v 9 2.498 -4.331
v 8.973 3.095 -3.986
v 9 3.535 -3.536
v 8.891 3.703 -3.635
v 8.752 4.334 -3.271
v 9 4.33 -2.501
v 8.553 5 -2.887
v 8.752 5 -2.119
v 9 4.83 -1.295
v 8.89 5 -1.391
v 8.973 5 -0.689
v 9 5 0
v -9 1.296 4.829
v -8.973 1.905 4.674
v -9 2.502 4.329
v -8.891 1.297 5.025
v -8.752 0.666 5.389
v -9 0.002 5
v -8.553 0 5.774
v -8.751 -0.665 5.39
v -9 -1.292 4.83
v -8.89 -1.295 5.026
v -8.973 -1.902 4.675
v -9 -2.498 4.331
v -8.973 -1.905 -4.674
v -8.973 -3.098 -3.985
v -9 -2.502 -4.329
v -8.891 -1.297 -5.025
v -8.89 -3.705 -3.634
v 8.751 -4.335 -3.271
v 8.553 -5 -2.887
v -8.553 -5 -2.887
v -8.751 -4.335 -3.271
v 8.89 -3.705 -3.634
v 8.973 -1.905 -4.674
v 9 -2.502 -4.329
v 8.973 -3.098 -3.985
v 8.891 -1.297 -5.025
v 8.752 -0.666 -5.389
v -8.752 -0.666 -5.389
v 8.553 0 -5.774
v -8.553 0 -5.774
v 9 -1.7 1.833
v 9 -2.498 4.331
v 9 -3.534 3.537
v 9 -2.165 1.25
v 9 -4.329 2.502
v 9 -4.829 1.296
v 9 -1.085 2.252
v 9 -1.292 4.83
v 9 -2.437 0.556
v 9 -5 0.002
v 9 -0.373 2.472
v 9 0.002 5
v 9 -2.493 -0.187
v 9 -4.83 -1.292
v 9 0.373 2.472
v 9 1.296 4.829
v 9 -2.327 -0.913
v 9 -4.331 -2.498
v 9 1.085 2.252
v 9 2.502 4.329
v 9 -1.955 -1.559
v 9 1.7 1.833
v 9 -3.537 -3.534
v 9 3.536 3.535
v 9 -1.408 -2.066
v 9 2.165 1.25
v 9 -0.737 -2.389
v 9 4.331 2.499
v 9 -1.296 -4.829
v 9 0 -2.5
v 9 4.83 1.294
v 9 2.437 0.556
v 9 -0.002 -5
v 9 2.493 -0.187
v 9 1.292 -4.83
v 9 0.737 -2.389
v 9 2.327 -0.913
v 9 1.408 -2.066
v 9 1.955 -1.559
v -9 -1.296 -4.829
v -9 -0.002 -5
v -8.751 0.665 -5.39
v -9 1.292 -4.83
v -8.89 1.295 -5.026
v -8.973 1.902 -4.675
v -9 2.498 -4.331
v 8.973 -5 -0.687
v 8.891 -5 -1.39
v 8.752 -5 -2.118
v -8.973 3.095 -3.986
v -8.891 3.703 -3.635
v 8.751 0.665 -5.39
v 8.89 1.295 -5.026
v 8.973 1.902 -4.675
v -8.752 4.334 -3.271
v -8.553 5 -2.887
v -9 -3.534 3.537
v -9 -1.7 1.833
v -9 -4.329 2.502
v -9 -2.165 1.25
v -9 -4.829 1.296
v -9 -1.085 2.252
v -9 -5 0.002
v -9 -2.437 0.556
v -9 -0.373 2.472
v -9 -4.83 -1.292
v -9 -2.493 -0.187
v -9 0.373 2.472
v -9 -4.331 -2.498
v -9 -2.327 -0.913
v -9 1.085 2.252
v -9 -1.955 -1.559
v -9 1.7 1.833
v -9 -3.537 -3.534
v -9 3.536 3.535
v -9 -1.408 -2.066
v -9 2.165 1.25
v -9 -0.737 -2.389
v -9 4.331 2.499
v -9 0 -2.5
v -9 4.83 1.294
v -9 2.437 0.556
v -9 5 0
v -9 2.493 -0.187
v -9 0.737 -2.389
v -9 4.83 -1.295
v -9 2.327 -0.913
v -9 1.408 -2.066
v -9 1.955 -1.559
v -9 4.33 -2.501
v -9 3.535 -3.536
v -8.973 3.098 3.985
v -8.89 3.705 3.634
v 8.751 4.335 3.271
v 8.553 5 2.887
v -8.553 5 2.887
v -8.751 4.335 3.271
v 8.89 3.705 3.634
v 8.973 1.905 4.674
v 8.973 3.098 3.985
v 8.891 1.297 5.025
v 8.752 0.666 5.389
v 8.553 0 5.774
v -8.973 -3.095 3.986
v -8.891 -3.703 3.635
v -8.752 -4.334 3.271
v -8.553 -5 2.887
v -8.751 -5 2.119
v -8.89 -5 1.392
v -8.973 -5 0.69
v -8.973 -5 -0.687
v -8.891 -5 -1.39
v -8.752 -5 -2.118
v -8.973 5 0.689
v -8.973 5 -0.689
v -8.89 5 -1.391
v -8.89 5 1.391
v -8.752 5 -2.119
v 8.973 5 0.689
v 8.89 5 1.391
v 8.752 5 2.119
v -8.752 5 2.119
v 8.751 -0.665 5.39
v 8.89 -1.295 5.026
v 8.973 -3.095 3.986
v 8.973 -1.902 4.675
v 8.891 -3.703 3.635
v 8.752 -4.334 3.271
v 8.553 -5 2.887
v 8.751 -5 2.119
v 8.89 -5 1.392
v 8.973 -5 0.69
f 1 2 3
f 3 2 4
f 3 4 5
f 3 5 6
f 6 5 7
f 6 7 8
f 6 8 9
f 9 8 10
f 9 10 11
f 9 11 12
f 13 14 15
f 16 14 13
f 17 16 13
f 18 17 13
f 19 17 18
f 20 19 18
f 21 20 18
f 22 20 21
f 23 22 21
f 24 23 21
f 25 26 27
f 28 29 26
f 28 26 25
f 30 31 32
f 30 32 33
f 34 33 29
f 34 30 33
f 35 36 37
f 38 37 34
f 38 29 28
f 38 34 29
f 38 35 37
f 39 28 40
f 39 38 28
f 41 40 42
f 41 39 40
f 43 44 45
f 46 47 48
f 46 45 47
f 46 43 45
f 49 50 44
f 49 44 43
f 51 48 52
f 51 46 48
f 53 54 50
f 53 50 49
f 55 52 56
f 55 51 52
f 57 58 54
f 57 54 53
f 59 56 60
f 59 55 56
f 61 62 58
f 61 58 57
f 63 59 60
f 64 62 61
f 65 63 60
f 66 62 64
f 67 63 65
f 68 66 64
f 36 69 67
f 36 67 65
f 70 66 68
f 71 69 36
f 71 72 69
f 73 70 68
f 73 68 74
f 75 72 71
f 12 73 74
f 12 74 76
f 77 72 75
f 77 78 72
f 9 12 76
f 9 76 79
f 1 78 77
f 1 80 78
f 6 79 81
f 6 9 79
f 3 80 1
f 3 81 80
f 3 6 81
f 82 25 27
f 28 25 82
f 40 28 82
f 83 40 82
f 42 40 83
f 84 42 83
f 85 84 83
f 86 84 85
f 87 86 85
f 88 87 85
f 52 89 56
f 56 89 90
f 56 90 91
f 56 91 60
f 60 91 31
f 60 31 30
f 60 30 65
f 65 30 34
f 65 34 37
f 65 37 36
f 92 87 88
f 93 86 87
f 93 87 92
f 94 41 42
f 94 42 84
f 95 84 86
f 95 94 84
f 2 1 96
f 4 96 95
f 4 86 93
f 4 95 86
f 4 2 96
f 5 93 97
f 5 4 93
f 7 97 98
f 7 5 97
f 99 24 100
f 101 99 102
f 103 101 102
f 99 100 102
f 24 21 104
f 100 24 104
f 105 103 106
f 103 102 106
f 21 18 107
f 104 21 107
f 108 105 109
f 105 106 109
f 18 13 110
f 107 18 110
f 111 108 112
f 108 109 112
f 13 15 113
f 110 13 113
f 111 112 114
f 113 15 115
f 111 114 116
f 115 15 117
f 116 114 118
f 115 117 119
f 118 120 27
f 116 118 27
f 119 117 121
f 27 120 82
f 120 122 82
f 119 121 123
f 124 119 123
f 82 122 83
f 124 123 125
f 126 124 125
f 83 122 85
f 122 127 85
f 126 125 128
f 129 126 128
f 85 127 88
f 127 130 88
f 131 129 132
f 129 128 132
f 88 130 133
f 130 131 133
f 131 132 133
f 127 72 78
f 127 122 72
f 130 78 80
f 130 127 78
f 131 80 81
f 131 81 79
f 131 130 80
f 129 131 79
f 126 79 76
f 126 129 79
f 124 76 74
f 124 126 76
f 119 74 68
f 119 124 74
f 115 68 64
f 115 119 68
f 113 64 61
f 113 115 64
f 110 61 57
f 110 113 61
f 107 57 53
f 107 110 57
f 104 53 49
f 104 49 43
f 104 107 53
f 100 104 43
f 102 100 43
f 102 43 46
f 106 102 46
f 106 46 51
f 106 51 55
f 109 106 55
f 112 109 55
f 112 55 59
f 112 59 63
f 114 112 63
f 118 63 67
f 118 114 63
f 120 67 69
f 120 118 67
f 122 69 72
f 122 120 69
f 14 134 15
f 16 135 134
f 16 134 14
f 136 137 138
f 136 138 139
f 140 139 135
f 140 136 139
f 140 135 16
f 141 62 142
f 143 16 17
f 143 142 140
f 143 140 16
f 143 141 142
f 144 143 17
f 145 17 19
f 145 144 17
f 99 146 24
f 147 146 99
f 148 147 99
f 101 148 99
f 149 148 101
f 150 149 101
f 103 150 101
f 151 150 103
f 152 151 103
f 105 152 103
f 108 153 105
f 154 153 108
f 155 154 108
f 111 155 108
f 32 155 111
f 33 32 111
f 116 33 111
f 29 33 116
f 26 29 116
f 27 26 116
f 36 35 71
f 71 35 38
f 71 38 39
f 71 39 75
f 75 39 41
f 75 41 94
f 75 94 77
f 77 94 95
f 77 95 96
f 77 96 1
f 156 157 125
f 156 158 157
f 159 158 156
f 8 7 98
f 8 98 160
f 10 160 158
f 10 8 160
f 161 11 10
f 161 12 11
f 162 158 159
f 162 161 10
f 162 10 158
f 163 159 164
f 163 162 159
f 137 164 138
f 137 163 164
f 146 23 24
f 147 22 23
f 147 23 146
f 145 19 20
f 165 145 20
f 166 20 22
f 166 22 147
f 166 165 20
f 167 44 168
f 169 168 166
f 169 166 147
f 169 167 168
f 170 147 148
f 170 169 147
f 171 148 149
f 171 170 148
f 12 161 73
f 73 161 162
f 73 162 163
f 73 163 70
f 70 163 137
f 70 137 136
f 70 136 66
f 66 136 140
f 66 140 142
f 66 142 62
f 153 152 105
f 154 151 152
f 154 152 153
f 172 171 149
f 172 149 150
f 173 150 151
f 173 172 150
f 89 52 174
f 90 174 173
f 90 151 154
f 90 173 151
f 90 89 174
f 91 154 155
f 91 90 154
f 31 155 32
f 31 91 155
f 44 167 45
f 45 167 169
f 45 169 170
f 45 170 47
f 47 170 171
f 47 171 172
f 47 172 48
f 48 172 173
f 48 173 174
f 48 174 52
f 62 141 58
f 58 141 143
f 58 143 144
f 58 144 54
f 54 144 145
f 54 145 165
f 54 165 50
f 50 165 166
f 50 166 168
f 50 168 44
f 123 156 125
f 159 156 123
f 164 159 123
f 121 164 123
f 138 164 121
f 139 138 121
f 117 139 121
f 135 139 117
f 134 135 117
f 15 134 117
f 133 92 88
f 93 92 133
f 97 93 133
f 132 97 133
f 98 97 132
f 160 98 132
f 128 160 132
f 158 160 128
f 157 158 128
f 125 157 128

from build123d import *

# Parameters (mm, degrees)
SKETCH1_R      = 2.5
EXTRUDE1_DEPTH = 9


# Read off the part's stored shape, not the designer's step: Cut-Extrude1
with BuildPart() as part:
    # Sketch1 → Extrude1 (new, symmetric)
    with BuildSketch(Plane(origin=(0, 0, 0), x_dir=(0, 0, -1), z_dir=(1, 0, 0))):
        Polygon((5.773502692, 0), (2.886751346, 5), (-2.886751346, 5), (-5.773502692, 0), (-2.886751346, -5), (2.886751346, -5), align=None)
        Circle(SKETCH1_R, mode=Mode.SUBTRACT)
    extrude(amount=EXTRUDE1_DEPTH, both=True)

    # Cut-Extrude1 outline → Cut-Extrude1 (revolve, cut)
    with BuildSketch(Plane.YX):
        Polygon((5.773502692, 9.000000845), (4.99999886, 9.000000845), (5.773502688, 8.553418015), align=None)
    cut_extrude1 = revolve(axis=Axis((0, 0, 0), (1, 0, 0)), mode=Mode.SUBTRACT)

    # Mirror1: Cut-Extrude1 across plane
    add(cut_extrude1.mirror(Plane(origin=(0, 0, 0), x_dir=(0, 0, 1), z_dir=(1, 0, 0))), mode=Mode.SUBTRACT)


solid = part.part
